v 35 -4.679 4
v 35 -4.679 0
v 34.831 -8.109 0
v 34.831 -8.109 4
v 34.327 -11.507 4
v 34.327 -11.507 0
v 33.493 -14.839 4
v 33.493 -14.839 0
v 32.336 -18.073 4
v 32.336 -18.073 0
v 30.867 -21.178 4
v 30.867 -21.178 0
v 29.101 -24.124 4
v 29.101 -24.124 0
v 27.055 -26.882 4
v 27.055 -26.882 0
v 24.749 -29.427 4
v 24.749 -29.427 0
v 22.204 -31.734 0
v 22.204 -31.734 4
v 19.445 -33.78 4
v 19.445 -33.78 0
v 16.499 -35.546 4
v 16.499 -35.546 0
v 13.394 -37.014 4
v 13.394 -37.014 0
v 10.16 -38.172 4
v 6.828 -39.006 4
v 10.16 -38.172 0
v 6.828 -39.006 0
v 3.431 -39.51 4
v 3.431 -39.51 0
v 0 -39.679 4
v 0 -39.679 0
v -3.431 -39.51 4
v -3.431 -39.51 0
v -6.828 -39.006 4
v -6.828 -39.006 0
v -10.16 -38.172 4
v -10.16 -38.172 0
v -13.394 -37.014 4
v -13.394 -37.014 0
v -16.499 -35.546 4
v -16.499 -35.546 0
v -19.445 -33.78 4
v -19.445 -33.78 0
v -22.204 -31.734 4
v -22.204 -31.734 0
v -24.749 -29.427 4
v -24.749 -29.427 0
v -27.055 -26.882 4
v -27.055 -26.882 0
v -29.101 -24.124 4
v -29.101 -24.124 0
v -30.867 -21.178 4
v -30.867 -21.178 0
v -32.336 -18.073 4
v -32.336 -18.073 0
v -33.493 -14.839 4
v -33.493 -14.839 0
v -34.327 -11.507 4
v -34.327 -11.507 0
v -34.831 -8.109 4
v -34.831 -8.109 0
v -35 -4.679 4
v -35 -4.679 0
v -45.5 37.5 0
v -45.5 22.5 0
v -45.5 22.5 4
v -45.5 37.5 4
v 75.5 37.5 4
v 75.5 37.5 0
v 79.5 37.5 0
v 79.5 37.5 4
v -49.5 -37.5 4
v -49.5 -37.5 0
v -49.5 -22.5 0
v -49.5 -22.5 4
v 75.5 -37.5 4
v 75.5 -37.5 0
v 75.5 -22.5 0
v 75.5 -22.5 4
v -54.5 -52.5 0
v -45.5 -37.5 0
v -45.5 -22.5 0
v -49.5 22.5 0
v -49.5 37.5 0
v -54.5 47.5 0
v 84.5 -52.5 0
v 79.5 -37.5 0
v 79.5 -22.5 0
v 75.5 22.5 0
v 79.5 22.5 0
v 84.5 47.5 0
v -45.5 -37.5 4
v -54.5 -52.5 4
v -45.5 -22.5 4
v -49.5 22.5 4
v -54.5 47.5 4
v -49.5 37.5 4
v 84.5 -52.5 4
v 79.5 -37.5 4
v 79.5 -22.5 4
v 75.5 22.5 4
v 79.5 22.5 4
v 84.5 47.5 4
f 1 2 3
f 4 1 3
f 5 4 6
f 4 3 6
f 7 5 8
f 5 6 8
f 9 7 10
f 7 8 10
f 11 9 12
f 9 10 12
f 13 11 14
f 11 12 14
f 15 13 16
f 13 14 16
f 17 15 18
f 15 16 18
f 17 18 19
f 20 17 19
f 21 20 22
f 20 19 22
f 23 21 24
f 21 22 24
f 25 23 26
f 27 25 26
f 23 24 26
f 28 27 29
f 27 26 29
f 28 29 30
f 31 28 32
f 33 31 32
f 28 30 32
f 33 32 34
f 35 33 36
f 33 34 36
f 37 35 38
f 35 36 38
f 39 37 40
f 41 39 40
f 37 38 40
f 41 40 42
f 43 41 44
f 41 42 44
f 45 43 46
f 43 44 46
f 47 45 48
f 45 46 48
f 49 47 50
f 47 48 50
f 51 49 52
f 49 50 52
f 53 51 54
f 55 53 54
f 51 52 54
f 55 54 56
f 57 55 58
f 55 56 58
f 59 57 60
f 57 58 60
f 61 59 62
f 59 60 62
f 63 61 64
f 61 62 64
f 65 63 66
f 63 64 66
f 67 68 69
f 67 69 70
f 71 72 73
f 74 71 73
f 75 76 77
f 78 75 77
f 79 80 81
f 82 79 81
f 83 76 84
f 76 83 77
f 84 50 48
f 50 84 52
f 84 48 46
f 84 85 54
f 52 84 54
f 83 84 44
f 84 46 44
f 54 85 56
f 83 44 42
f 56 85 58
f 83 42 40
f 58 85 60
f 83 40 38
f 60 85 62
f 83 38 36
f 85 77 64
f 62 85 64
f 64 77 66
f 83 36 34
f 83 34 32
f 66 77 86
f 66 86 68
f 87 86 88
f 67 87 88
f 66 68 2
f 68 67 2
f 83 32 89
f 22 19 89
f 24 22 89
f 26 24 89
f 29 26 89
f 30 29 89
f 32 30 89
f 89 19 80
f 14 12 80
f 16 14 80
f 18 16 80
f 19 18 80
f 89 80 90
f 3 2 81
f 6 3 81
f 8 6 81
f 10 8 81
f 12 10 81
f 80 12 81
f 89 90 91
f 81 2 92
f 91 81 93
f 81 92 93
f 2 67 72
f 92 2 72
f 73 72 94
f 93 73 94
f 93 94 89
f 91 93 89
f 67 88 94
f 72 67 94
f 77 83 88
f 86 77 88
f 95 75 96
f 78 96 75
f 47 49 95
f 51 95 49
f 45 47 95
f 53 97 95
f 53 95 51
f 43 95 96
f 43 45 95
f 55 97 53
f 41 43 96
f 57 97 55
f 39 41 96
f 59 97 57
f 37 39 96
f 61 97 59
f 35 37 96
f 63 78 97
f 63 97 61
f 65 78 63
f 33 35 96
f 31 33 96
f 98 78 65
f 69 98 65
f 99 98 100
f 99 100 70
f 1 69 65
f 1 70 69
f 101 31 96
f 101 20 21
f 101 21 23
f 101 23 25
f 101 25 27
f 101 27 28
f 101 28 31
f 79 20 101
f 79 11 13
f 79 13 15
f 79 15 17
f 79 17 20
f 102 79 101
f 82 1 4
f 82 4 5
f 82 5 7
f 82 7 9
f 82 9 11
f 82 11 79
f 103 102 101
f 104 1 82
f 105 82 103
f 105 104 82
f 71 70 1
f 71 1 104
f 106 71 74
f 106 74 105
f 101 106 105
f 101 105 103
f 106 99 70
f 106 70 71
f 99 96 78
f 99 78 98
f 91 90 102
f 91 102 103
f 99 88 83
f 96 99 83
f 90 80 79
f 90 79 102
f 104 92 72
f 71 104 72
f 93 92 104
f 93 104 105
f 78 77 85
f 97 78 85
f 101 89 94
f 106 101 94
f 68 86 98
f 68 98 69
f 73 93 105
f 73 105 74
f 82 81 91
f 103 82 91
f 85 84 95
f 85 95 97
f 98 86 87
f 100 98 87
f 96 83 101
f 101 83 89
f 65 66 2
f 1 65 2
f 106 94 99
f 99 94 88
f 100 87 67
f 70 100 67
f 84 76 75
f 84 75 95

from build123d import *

# Parameters (mm, degrees)
SKETCH1_W           = 4
SKETCH1_H           = 15
BOSS_EXTRUDE1_DEPTH = 4


with BuildPart() as part:
    # Sketch1 → Boss-Extrude1 (new body)
    with BuildSketch(Plane.XY):
        Polygon((-54.5, -52.5), (64.5, -52.5), (84.5, -52.5), (84.5, 47.5), (64.5, 47.5), (-54.5, 47.5), align=None)
        with BuildLine():
            Line((-35, -4.678634488), (35, -4.678634488))
            ThreePointArc((35, -4.678634488), (0, -39.678634488), (-35, -4.678634488))
        make_face(mode=Mode.SUBTRACT)
        with Locations((-47.5, -30)):
            Rectangle(SKETCH1_W, SKETCH1_H, mode=Mode.SUBTRACT)
        with Locations((-47.5, 30)):
            Rectangle(SKETCH1_W, SKETCH1_H, mode=Mode.SUBTRACT)
        with Locations((77.5, 30)):
            Rectangle(SKETCH1_W, SKETCH1_H, mode=Mode.SUBTRACT)
        with Locations((77.5, -30)):
            Rectangle(SKETCH1_W, SKETCH1_H, mode=Mode.SUBTRACT)
    extrude(amount=BOSS_EXTRUDE1_DEPTH)


solid = part.part
